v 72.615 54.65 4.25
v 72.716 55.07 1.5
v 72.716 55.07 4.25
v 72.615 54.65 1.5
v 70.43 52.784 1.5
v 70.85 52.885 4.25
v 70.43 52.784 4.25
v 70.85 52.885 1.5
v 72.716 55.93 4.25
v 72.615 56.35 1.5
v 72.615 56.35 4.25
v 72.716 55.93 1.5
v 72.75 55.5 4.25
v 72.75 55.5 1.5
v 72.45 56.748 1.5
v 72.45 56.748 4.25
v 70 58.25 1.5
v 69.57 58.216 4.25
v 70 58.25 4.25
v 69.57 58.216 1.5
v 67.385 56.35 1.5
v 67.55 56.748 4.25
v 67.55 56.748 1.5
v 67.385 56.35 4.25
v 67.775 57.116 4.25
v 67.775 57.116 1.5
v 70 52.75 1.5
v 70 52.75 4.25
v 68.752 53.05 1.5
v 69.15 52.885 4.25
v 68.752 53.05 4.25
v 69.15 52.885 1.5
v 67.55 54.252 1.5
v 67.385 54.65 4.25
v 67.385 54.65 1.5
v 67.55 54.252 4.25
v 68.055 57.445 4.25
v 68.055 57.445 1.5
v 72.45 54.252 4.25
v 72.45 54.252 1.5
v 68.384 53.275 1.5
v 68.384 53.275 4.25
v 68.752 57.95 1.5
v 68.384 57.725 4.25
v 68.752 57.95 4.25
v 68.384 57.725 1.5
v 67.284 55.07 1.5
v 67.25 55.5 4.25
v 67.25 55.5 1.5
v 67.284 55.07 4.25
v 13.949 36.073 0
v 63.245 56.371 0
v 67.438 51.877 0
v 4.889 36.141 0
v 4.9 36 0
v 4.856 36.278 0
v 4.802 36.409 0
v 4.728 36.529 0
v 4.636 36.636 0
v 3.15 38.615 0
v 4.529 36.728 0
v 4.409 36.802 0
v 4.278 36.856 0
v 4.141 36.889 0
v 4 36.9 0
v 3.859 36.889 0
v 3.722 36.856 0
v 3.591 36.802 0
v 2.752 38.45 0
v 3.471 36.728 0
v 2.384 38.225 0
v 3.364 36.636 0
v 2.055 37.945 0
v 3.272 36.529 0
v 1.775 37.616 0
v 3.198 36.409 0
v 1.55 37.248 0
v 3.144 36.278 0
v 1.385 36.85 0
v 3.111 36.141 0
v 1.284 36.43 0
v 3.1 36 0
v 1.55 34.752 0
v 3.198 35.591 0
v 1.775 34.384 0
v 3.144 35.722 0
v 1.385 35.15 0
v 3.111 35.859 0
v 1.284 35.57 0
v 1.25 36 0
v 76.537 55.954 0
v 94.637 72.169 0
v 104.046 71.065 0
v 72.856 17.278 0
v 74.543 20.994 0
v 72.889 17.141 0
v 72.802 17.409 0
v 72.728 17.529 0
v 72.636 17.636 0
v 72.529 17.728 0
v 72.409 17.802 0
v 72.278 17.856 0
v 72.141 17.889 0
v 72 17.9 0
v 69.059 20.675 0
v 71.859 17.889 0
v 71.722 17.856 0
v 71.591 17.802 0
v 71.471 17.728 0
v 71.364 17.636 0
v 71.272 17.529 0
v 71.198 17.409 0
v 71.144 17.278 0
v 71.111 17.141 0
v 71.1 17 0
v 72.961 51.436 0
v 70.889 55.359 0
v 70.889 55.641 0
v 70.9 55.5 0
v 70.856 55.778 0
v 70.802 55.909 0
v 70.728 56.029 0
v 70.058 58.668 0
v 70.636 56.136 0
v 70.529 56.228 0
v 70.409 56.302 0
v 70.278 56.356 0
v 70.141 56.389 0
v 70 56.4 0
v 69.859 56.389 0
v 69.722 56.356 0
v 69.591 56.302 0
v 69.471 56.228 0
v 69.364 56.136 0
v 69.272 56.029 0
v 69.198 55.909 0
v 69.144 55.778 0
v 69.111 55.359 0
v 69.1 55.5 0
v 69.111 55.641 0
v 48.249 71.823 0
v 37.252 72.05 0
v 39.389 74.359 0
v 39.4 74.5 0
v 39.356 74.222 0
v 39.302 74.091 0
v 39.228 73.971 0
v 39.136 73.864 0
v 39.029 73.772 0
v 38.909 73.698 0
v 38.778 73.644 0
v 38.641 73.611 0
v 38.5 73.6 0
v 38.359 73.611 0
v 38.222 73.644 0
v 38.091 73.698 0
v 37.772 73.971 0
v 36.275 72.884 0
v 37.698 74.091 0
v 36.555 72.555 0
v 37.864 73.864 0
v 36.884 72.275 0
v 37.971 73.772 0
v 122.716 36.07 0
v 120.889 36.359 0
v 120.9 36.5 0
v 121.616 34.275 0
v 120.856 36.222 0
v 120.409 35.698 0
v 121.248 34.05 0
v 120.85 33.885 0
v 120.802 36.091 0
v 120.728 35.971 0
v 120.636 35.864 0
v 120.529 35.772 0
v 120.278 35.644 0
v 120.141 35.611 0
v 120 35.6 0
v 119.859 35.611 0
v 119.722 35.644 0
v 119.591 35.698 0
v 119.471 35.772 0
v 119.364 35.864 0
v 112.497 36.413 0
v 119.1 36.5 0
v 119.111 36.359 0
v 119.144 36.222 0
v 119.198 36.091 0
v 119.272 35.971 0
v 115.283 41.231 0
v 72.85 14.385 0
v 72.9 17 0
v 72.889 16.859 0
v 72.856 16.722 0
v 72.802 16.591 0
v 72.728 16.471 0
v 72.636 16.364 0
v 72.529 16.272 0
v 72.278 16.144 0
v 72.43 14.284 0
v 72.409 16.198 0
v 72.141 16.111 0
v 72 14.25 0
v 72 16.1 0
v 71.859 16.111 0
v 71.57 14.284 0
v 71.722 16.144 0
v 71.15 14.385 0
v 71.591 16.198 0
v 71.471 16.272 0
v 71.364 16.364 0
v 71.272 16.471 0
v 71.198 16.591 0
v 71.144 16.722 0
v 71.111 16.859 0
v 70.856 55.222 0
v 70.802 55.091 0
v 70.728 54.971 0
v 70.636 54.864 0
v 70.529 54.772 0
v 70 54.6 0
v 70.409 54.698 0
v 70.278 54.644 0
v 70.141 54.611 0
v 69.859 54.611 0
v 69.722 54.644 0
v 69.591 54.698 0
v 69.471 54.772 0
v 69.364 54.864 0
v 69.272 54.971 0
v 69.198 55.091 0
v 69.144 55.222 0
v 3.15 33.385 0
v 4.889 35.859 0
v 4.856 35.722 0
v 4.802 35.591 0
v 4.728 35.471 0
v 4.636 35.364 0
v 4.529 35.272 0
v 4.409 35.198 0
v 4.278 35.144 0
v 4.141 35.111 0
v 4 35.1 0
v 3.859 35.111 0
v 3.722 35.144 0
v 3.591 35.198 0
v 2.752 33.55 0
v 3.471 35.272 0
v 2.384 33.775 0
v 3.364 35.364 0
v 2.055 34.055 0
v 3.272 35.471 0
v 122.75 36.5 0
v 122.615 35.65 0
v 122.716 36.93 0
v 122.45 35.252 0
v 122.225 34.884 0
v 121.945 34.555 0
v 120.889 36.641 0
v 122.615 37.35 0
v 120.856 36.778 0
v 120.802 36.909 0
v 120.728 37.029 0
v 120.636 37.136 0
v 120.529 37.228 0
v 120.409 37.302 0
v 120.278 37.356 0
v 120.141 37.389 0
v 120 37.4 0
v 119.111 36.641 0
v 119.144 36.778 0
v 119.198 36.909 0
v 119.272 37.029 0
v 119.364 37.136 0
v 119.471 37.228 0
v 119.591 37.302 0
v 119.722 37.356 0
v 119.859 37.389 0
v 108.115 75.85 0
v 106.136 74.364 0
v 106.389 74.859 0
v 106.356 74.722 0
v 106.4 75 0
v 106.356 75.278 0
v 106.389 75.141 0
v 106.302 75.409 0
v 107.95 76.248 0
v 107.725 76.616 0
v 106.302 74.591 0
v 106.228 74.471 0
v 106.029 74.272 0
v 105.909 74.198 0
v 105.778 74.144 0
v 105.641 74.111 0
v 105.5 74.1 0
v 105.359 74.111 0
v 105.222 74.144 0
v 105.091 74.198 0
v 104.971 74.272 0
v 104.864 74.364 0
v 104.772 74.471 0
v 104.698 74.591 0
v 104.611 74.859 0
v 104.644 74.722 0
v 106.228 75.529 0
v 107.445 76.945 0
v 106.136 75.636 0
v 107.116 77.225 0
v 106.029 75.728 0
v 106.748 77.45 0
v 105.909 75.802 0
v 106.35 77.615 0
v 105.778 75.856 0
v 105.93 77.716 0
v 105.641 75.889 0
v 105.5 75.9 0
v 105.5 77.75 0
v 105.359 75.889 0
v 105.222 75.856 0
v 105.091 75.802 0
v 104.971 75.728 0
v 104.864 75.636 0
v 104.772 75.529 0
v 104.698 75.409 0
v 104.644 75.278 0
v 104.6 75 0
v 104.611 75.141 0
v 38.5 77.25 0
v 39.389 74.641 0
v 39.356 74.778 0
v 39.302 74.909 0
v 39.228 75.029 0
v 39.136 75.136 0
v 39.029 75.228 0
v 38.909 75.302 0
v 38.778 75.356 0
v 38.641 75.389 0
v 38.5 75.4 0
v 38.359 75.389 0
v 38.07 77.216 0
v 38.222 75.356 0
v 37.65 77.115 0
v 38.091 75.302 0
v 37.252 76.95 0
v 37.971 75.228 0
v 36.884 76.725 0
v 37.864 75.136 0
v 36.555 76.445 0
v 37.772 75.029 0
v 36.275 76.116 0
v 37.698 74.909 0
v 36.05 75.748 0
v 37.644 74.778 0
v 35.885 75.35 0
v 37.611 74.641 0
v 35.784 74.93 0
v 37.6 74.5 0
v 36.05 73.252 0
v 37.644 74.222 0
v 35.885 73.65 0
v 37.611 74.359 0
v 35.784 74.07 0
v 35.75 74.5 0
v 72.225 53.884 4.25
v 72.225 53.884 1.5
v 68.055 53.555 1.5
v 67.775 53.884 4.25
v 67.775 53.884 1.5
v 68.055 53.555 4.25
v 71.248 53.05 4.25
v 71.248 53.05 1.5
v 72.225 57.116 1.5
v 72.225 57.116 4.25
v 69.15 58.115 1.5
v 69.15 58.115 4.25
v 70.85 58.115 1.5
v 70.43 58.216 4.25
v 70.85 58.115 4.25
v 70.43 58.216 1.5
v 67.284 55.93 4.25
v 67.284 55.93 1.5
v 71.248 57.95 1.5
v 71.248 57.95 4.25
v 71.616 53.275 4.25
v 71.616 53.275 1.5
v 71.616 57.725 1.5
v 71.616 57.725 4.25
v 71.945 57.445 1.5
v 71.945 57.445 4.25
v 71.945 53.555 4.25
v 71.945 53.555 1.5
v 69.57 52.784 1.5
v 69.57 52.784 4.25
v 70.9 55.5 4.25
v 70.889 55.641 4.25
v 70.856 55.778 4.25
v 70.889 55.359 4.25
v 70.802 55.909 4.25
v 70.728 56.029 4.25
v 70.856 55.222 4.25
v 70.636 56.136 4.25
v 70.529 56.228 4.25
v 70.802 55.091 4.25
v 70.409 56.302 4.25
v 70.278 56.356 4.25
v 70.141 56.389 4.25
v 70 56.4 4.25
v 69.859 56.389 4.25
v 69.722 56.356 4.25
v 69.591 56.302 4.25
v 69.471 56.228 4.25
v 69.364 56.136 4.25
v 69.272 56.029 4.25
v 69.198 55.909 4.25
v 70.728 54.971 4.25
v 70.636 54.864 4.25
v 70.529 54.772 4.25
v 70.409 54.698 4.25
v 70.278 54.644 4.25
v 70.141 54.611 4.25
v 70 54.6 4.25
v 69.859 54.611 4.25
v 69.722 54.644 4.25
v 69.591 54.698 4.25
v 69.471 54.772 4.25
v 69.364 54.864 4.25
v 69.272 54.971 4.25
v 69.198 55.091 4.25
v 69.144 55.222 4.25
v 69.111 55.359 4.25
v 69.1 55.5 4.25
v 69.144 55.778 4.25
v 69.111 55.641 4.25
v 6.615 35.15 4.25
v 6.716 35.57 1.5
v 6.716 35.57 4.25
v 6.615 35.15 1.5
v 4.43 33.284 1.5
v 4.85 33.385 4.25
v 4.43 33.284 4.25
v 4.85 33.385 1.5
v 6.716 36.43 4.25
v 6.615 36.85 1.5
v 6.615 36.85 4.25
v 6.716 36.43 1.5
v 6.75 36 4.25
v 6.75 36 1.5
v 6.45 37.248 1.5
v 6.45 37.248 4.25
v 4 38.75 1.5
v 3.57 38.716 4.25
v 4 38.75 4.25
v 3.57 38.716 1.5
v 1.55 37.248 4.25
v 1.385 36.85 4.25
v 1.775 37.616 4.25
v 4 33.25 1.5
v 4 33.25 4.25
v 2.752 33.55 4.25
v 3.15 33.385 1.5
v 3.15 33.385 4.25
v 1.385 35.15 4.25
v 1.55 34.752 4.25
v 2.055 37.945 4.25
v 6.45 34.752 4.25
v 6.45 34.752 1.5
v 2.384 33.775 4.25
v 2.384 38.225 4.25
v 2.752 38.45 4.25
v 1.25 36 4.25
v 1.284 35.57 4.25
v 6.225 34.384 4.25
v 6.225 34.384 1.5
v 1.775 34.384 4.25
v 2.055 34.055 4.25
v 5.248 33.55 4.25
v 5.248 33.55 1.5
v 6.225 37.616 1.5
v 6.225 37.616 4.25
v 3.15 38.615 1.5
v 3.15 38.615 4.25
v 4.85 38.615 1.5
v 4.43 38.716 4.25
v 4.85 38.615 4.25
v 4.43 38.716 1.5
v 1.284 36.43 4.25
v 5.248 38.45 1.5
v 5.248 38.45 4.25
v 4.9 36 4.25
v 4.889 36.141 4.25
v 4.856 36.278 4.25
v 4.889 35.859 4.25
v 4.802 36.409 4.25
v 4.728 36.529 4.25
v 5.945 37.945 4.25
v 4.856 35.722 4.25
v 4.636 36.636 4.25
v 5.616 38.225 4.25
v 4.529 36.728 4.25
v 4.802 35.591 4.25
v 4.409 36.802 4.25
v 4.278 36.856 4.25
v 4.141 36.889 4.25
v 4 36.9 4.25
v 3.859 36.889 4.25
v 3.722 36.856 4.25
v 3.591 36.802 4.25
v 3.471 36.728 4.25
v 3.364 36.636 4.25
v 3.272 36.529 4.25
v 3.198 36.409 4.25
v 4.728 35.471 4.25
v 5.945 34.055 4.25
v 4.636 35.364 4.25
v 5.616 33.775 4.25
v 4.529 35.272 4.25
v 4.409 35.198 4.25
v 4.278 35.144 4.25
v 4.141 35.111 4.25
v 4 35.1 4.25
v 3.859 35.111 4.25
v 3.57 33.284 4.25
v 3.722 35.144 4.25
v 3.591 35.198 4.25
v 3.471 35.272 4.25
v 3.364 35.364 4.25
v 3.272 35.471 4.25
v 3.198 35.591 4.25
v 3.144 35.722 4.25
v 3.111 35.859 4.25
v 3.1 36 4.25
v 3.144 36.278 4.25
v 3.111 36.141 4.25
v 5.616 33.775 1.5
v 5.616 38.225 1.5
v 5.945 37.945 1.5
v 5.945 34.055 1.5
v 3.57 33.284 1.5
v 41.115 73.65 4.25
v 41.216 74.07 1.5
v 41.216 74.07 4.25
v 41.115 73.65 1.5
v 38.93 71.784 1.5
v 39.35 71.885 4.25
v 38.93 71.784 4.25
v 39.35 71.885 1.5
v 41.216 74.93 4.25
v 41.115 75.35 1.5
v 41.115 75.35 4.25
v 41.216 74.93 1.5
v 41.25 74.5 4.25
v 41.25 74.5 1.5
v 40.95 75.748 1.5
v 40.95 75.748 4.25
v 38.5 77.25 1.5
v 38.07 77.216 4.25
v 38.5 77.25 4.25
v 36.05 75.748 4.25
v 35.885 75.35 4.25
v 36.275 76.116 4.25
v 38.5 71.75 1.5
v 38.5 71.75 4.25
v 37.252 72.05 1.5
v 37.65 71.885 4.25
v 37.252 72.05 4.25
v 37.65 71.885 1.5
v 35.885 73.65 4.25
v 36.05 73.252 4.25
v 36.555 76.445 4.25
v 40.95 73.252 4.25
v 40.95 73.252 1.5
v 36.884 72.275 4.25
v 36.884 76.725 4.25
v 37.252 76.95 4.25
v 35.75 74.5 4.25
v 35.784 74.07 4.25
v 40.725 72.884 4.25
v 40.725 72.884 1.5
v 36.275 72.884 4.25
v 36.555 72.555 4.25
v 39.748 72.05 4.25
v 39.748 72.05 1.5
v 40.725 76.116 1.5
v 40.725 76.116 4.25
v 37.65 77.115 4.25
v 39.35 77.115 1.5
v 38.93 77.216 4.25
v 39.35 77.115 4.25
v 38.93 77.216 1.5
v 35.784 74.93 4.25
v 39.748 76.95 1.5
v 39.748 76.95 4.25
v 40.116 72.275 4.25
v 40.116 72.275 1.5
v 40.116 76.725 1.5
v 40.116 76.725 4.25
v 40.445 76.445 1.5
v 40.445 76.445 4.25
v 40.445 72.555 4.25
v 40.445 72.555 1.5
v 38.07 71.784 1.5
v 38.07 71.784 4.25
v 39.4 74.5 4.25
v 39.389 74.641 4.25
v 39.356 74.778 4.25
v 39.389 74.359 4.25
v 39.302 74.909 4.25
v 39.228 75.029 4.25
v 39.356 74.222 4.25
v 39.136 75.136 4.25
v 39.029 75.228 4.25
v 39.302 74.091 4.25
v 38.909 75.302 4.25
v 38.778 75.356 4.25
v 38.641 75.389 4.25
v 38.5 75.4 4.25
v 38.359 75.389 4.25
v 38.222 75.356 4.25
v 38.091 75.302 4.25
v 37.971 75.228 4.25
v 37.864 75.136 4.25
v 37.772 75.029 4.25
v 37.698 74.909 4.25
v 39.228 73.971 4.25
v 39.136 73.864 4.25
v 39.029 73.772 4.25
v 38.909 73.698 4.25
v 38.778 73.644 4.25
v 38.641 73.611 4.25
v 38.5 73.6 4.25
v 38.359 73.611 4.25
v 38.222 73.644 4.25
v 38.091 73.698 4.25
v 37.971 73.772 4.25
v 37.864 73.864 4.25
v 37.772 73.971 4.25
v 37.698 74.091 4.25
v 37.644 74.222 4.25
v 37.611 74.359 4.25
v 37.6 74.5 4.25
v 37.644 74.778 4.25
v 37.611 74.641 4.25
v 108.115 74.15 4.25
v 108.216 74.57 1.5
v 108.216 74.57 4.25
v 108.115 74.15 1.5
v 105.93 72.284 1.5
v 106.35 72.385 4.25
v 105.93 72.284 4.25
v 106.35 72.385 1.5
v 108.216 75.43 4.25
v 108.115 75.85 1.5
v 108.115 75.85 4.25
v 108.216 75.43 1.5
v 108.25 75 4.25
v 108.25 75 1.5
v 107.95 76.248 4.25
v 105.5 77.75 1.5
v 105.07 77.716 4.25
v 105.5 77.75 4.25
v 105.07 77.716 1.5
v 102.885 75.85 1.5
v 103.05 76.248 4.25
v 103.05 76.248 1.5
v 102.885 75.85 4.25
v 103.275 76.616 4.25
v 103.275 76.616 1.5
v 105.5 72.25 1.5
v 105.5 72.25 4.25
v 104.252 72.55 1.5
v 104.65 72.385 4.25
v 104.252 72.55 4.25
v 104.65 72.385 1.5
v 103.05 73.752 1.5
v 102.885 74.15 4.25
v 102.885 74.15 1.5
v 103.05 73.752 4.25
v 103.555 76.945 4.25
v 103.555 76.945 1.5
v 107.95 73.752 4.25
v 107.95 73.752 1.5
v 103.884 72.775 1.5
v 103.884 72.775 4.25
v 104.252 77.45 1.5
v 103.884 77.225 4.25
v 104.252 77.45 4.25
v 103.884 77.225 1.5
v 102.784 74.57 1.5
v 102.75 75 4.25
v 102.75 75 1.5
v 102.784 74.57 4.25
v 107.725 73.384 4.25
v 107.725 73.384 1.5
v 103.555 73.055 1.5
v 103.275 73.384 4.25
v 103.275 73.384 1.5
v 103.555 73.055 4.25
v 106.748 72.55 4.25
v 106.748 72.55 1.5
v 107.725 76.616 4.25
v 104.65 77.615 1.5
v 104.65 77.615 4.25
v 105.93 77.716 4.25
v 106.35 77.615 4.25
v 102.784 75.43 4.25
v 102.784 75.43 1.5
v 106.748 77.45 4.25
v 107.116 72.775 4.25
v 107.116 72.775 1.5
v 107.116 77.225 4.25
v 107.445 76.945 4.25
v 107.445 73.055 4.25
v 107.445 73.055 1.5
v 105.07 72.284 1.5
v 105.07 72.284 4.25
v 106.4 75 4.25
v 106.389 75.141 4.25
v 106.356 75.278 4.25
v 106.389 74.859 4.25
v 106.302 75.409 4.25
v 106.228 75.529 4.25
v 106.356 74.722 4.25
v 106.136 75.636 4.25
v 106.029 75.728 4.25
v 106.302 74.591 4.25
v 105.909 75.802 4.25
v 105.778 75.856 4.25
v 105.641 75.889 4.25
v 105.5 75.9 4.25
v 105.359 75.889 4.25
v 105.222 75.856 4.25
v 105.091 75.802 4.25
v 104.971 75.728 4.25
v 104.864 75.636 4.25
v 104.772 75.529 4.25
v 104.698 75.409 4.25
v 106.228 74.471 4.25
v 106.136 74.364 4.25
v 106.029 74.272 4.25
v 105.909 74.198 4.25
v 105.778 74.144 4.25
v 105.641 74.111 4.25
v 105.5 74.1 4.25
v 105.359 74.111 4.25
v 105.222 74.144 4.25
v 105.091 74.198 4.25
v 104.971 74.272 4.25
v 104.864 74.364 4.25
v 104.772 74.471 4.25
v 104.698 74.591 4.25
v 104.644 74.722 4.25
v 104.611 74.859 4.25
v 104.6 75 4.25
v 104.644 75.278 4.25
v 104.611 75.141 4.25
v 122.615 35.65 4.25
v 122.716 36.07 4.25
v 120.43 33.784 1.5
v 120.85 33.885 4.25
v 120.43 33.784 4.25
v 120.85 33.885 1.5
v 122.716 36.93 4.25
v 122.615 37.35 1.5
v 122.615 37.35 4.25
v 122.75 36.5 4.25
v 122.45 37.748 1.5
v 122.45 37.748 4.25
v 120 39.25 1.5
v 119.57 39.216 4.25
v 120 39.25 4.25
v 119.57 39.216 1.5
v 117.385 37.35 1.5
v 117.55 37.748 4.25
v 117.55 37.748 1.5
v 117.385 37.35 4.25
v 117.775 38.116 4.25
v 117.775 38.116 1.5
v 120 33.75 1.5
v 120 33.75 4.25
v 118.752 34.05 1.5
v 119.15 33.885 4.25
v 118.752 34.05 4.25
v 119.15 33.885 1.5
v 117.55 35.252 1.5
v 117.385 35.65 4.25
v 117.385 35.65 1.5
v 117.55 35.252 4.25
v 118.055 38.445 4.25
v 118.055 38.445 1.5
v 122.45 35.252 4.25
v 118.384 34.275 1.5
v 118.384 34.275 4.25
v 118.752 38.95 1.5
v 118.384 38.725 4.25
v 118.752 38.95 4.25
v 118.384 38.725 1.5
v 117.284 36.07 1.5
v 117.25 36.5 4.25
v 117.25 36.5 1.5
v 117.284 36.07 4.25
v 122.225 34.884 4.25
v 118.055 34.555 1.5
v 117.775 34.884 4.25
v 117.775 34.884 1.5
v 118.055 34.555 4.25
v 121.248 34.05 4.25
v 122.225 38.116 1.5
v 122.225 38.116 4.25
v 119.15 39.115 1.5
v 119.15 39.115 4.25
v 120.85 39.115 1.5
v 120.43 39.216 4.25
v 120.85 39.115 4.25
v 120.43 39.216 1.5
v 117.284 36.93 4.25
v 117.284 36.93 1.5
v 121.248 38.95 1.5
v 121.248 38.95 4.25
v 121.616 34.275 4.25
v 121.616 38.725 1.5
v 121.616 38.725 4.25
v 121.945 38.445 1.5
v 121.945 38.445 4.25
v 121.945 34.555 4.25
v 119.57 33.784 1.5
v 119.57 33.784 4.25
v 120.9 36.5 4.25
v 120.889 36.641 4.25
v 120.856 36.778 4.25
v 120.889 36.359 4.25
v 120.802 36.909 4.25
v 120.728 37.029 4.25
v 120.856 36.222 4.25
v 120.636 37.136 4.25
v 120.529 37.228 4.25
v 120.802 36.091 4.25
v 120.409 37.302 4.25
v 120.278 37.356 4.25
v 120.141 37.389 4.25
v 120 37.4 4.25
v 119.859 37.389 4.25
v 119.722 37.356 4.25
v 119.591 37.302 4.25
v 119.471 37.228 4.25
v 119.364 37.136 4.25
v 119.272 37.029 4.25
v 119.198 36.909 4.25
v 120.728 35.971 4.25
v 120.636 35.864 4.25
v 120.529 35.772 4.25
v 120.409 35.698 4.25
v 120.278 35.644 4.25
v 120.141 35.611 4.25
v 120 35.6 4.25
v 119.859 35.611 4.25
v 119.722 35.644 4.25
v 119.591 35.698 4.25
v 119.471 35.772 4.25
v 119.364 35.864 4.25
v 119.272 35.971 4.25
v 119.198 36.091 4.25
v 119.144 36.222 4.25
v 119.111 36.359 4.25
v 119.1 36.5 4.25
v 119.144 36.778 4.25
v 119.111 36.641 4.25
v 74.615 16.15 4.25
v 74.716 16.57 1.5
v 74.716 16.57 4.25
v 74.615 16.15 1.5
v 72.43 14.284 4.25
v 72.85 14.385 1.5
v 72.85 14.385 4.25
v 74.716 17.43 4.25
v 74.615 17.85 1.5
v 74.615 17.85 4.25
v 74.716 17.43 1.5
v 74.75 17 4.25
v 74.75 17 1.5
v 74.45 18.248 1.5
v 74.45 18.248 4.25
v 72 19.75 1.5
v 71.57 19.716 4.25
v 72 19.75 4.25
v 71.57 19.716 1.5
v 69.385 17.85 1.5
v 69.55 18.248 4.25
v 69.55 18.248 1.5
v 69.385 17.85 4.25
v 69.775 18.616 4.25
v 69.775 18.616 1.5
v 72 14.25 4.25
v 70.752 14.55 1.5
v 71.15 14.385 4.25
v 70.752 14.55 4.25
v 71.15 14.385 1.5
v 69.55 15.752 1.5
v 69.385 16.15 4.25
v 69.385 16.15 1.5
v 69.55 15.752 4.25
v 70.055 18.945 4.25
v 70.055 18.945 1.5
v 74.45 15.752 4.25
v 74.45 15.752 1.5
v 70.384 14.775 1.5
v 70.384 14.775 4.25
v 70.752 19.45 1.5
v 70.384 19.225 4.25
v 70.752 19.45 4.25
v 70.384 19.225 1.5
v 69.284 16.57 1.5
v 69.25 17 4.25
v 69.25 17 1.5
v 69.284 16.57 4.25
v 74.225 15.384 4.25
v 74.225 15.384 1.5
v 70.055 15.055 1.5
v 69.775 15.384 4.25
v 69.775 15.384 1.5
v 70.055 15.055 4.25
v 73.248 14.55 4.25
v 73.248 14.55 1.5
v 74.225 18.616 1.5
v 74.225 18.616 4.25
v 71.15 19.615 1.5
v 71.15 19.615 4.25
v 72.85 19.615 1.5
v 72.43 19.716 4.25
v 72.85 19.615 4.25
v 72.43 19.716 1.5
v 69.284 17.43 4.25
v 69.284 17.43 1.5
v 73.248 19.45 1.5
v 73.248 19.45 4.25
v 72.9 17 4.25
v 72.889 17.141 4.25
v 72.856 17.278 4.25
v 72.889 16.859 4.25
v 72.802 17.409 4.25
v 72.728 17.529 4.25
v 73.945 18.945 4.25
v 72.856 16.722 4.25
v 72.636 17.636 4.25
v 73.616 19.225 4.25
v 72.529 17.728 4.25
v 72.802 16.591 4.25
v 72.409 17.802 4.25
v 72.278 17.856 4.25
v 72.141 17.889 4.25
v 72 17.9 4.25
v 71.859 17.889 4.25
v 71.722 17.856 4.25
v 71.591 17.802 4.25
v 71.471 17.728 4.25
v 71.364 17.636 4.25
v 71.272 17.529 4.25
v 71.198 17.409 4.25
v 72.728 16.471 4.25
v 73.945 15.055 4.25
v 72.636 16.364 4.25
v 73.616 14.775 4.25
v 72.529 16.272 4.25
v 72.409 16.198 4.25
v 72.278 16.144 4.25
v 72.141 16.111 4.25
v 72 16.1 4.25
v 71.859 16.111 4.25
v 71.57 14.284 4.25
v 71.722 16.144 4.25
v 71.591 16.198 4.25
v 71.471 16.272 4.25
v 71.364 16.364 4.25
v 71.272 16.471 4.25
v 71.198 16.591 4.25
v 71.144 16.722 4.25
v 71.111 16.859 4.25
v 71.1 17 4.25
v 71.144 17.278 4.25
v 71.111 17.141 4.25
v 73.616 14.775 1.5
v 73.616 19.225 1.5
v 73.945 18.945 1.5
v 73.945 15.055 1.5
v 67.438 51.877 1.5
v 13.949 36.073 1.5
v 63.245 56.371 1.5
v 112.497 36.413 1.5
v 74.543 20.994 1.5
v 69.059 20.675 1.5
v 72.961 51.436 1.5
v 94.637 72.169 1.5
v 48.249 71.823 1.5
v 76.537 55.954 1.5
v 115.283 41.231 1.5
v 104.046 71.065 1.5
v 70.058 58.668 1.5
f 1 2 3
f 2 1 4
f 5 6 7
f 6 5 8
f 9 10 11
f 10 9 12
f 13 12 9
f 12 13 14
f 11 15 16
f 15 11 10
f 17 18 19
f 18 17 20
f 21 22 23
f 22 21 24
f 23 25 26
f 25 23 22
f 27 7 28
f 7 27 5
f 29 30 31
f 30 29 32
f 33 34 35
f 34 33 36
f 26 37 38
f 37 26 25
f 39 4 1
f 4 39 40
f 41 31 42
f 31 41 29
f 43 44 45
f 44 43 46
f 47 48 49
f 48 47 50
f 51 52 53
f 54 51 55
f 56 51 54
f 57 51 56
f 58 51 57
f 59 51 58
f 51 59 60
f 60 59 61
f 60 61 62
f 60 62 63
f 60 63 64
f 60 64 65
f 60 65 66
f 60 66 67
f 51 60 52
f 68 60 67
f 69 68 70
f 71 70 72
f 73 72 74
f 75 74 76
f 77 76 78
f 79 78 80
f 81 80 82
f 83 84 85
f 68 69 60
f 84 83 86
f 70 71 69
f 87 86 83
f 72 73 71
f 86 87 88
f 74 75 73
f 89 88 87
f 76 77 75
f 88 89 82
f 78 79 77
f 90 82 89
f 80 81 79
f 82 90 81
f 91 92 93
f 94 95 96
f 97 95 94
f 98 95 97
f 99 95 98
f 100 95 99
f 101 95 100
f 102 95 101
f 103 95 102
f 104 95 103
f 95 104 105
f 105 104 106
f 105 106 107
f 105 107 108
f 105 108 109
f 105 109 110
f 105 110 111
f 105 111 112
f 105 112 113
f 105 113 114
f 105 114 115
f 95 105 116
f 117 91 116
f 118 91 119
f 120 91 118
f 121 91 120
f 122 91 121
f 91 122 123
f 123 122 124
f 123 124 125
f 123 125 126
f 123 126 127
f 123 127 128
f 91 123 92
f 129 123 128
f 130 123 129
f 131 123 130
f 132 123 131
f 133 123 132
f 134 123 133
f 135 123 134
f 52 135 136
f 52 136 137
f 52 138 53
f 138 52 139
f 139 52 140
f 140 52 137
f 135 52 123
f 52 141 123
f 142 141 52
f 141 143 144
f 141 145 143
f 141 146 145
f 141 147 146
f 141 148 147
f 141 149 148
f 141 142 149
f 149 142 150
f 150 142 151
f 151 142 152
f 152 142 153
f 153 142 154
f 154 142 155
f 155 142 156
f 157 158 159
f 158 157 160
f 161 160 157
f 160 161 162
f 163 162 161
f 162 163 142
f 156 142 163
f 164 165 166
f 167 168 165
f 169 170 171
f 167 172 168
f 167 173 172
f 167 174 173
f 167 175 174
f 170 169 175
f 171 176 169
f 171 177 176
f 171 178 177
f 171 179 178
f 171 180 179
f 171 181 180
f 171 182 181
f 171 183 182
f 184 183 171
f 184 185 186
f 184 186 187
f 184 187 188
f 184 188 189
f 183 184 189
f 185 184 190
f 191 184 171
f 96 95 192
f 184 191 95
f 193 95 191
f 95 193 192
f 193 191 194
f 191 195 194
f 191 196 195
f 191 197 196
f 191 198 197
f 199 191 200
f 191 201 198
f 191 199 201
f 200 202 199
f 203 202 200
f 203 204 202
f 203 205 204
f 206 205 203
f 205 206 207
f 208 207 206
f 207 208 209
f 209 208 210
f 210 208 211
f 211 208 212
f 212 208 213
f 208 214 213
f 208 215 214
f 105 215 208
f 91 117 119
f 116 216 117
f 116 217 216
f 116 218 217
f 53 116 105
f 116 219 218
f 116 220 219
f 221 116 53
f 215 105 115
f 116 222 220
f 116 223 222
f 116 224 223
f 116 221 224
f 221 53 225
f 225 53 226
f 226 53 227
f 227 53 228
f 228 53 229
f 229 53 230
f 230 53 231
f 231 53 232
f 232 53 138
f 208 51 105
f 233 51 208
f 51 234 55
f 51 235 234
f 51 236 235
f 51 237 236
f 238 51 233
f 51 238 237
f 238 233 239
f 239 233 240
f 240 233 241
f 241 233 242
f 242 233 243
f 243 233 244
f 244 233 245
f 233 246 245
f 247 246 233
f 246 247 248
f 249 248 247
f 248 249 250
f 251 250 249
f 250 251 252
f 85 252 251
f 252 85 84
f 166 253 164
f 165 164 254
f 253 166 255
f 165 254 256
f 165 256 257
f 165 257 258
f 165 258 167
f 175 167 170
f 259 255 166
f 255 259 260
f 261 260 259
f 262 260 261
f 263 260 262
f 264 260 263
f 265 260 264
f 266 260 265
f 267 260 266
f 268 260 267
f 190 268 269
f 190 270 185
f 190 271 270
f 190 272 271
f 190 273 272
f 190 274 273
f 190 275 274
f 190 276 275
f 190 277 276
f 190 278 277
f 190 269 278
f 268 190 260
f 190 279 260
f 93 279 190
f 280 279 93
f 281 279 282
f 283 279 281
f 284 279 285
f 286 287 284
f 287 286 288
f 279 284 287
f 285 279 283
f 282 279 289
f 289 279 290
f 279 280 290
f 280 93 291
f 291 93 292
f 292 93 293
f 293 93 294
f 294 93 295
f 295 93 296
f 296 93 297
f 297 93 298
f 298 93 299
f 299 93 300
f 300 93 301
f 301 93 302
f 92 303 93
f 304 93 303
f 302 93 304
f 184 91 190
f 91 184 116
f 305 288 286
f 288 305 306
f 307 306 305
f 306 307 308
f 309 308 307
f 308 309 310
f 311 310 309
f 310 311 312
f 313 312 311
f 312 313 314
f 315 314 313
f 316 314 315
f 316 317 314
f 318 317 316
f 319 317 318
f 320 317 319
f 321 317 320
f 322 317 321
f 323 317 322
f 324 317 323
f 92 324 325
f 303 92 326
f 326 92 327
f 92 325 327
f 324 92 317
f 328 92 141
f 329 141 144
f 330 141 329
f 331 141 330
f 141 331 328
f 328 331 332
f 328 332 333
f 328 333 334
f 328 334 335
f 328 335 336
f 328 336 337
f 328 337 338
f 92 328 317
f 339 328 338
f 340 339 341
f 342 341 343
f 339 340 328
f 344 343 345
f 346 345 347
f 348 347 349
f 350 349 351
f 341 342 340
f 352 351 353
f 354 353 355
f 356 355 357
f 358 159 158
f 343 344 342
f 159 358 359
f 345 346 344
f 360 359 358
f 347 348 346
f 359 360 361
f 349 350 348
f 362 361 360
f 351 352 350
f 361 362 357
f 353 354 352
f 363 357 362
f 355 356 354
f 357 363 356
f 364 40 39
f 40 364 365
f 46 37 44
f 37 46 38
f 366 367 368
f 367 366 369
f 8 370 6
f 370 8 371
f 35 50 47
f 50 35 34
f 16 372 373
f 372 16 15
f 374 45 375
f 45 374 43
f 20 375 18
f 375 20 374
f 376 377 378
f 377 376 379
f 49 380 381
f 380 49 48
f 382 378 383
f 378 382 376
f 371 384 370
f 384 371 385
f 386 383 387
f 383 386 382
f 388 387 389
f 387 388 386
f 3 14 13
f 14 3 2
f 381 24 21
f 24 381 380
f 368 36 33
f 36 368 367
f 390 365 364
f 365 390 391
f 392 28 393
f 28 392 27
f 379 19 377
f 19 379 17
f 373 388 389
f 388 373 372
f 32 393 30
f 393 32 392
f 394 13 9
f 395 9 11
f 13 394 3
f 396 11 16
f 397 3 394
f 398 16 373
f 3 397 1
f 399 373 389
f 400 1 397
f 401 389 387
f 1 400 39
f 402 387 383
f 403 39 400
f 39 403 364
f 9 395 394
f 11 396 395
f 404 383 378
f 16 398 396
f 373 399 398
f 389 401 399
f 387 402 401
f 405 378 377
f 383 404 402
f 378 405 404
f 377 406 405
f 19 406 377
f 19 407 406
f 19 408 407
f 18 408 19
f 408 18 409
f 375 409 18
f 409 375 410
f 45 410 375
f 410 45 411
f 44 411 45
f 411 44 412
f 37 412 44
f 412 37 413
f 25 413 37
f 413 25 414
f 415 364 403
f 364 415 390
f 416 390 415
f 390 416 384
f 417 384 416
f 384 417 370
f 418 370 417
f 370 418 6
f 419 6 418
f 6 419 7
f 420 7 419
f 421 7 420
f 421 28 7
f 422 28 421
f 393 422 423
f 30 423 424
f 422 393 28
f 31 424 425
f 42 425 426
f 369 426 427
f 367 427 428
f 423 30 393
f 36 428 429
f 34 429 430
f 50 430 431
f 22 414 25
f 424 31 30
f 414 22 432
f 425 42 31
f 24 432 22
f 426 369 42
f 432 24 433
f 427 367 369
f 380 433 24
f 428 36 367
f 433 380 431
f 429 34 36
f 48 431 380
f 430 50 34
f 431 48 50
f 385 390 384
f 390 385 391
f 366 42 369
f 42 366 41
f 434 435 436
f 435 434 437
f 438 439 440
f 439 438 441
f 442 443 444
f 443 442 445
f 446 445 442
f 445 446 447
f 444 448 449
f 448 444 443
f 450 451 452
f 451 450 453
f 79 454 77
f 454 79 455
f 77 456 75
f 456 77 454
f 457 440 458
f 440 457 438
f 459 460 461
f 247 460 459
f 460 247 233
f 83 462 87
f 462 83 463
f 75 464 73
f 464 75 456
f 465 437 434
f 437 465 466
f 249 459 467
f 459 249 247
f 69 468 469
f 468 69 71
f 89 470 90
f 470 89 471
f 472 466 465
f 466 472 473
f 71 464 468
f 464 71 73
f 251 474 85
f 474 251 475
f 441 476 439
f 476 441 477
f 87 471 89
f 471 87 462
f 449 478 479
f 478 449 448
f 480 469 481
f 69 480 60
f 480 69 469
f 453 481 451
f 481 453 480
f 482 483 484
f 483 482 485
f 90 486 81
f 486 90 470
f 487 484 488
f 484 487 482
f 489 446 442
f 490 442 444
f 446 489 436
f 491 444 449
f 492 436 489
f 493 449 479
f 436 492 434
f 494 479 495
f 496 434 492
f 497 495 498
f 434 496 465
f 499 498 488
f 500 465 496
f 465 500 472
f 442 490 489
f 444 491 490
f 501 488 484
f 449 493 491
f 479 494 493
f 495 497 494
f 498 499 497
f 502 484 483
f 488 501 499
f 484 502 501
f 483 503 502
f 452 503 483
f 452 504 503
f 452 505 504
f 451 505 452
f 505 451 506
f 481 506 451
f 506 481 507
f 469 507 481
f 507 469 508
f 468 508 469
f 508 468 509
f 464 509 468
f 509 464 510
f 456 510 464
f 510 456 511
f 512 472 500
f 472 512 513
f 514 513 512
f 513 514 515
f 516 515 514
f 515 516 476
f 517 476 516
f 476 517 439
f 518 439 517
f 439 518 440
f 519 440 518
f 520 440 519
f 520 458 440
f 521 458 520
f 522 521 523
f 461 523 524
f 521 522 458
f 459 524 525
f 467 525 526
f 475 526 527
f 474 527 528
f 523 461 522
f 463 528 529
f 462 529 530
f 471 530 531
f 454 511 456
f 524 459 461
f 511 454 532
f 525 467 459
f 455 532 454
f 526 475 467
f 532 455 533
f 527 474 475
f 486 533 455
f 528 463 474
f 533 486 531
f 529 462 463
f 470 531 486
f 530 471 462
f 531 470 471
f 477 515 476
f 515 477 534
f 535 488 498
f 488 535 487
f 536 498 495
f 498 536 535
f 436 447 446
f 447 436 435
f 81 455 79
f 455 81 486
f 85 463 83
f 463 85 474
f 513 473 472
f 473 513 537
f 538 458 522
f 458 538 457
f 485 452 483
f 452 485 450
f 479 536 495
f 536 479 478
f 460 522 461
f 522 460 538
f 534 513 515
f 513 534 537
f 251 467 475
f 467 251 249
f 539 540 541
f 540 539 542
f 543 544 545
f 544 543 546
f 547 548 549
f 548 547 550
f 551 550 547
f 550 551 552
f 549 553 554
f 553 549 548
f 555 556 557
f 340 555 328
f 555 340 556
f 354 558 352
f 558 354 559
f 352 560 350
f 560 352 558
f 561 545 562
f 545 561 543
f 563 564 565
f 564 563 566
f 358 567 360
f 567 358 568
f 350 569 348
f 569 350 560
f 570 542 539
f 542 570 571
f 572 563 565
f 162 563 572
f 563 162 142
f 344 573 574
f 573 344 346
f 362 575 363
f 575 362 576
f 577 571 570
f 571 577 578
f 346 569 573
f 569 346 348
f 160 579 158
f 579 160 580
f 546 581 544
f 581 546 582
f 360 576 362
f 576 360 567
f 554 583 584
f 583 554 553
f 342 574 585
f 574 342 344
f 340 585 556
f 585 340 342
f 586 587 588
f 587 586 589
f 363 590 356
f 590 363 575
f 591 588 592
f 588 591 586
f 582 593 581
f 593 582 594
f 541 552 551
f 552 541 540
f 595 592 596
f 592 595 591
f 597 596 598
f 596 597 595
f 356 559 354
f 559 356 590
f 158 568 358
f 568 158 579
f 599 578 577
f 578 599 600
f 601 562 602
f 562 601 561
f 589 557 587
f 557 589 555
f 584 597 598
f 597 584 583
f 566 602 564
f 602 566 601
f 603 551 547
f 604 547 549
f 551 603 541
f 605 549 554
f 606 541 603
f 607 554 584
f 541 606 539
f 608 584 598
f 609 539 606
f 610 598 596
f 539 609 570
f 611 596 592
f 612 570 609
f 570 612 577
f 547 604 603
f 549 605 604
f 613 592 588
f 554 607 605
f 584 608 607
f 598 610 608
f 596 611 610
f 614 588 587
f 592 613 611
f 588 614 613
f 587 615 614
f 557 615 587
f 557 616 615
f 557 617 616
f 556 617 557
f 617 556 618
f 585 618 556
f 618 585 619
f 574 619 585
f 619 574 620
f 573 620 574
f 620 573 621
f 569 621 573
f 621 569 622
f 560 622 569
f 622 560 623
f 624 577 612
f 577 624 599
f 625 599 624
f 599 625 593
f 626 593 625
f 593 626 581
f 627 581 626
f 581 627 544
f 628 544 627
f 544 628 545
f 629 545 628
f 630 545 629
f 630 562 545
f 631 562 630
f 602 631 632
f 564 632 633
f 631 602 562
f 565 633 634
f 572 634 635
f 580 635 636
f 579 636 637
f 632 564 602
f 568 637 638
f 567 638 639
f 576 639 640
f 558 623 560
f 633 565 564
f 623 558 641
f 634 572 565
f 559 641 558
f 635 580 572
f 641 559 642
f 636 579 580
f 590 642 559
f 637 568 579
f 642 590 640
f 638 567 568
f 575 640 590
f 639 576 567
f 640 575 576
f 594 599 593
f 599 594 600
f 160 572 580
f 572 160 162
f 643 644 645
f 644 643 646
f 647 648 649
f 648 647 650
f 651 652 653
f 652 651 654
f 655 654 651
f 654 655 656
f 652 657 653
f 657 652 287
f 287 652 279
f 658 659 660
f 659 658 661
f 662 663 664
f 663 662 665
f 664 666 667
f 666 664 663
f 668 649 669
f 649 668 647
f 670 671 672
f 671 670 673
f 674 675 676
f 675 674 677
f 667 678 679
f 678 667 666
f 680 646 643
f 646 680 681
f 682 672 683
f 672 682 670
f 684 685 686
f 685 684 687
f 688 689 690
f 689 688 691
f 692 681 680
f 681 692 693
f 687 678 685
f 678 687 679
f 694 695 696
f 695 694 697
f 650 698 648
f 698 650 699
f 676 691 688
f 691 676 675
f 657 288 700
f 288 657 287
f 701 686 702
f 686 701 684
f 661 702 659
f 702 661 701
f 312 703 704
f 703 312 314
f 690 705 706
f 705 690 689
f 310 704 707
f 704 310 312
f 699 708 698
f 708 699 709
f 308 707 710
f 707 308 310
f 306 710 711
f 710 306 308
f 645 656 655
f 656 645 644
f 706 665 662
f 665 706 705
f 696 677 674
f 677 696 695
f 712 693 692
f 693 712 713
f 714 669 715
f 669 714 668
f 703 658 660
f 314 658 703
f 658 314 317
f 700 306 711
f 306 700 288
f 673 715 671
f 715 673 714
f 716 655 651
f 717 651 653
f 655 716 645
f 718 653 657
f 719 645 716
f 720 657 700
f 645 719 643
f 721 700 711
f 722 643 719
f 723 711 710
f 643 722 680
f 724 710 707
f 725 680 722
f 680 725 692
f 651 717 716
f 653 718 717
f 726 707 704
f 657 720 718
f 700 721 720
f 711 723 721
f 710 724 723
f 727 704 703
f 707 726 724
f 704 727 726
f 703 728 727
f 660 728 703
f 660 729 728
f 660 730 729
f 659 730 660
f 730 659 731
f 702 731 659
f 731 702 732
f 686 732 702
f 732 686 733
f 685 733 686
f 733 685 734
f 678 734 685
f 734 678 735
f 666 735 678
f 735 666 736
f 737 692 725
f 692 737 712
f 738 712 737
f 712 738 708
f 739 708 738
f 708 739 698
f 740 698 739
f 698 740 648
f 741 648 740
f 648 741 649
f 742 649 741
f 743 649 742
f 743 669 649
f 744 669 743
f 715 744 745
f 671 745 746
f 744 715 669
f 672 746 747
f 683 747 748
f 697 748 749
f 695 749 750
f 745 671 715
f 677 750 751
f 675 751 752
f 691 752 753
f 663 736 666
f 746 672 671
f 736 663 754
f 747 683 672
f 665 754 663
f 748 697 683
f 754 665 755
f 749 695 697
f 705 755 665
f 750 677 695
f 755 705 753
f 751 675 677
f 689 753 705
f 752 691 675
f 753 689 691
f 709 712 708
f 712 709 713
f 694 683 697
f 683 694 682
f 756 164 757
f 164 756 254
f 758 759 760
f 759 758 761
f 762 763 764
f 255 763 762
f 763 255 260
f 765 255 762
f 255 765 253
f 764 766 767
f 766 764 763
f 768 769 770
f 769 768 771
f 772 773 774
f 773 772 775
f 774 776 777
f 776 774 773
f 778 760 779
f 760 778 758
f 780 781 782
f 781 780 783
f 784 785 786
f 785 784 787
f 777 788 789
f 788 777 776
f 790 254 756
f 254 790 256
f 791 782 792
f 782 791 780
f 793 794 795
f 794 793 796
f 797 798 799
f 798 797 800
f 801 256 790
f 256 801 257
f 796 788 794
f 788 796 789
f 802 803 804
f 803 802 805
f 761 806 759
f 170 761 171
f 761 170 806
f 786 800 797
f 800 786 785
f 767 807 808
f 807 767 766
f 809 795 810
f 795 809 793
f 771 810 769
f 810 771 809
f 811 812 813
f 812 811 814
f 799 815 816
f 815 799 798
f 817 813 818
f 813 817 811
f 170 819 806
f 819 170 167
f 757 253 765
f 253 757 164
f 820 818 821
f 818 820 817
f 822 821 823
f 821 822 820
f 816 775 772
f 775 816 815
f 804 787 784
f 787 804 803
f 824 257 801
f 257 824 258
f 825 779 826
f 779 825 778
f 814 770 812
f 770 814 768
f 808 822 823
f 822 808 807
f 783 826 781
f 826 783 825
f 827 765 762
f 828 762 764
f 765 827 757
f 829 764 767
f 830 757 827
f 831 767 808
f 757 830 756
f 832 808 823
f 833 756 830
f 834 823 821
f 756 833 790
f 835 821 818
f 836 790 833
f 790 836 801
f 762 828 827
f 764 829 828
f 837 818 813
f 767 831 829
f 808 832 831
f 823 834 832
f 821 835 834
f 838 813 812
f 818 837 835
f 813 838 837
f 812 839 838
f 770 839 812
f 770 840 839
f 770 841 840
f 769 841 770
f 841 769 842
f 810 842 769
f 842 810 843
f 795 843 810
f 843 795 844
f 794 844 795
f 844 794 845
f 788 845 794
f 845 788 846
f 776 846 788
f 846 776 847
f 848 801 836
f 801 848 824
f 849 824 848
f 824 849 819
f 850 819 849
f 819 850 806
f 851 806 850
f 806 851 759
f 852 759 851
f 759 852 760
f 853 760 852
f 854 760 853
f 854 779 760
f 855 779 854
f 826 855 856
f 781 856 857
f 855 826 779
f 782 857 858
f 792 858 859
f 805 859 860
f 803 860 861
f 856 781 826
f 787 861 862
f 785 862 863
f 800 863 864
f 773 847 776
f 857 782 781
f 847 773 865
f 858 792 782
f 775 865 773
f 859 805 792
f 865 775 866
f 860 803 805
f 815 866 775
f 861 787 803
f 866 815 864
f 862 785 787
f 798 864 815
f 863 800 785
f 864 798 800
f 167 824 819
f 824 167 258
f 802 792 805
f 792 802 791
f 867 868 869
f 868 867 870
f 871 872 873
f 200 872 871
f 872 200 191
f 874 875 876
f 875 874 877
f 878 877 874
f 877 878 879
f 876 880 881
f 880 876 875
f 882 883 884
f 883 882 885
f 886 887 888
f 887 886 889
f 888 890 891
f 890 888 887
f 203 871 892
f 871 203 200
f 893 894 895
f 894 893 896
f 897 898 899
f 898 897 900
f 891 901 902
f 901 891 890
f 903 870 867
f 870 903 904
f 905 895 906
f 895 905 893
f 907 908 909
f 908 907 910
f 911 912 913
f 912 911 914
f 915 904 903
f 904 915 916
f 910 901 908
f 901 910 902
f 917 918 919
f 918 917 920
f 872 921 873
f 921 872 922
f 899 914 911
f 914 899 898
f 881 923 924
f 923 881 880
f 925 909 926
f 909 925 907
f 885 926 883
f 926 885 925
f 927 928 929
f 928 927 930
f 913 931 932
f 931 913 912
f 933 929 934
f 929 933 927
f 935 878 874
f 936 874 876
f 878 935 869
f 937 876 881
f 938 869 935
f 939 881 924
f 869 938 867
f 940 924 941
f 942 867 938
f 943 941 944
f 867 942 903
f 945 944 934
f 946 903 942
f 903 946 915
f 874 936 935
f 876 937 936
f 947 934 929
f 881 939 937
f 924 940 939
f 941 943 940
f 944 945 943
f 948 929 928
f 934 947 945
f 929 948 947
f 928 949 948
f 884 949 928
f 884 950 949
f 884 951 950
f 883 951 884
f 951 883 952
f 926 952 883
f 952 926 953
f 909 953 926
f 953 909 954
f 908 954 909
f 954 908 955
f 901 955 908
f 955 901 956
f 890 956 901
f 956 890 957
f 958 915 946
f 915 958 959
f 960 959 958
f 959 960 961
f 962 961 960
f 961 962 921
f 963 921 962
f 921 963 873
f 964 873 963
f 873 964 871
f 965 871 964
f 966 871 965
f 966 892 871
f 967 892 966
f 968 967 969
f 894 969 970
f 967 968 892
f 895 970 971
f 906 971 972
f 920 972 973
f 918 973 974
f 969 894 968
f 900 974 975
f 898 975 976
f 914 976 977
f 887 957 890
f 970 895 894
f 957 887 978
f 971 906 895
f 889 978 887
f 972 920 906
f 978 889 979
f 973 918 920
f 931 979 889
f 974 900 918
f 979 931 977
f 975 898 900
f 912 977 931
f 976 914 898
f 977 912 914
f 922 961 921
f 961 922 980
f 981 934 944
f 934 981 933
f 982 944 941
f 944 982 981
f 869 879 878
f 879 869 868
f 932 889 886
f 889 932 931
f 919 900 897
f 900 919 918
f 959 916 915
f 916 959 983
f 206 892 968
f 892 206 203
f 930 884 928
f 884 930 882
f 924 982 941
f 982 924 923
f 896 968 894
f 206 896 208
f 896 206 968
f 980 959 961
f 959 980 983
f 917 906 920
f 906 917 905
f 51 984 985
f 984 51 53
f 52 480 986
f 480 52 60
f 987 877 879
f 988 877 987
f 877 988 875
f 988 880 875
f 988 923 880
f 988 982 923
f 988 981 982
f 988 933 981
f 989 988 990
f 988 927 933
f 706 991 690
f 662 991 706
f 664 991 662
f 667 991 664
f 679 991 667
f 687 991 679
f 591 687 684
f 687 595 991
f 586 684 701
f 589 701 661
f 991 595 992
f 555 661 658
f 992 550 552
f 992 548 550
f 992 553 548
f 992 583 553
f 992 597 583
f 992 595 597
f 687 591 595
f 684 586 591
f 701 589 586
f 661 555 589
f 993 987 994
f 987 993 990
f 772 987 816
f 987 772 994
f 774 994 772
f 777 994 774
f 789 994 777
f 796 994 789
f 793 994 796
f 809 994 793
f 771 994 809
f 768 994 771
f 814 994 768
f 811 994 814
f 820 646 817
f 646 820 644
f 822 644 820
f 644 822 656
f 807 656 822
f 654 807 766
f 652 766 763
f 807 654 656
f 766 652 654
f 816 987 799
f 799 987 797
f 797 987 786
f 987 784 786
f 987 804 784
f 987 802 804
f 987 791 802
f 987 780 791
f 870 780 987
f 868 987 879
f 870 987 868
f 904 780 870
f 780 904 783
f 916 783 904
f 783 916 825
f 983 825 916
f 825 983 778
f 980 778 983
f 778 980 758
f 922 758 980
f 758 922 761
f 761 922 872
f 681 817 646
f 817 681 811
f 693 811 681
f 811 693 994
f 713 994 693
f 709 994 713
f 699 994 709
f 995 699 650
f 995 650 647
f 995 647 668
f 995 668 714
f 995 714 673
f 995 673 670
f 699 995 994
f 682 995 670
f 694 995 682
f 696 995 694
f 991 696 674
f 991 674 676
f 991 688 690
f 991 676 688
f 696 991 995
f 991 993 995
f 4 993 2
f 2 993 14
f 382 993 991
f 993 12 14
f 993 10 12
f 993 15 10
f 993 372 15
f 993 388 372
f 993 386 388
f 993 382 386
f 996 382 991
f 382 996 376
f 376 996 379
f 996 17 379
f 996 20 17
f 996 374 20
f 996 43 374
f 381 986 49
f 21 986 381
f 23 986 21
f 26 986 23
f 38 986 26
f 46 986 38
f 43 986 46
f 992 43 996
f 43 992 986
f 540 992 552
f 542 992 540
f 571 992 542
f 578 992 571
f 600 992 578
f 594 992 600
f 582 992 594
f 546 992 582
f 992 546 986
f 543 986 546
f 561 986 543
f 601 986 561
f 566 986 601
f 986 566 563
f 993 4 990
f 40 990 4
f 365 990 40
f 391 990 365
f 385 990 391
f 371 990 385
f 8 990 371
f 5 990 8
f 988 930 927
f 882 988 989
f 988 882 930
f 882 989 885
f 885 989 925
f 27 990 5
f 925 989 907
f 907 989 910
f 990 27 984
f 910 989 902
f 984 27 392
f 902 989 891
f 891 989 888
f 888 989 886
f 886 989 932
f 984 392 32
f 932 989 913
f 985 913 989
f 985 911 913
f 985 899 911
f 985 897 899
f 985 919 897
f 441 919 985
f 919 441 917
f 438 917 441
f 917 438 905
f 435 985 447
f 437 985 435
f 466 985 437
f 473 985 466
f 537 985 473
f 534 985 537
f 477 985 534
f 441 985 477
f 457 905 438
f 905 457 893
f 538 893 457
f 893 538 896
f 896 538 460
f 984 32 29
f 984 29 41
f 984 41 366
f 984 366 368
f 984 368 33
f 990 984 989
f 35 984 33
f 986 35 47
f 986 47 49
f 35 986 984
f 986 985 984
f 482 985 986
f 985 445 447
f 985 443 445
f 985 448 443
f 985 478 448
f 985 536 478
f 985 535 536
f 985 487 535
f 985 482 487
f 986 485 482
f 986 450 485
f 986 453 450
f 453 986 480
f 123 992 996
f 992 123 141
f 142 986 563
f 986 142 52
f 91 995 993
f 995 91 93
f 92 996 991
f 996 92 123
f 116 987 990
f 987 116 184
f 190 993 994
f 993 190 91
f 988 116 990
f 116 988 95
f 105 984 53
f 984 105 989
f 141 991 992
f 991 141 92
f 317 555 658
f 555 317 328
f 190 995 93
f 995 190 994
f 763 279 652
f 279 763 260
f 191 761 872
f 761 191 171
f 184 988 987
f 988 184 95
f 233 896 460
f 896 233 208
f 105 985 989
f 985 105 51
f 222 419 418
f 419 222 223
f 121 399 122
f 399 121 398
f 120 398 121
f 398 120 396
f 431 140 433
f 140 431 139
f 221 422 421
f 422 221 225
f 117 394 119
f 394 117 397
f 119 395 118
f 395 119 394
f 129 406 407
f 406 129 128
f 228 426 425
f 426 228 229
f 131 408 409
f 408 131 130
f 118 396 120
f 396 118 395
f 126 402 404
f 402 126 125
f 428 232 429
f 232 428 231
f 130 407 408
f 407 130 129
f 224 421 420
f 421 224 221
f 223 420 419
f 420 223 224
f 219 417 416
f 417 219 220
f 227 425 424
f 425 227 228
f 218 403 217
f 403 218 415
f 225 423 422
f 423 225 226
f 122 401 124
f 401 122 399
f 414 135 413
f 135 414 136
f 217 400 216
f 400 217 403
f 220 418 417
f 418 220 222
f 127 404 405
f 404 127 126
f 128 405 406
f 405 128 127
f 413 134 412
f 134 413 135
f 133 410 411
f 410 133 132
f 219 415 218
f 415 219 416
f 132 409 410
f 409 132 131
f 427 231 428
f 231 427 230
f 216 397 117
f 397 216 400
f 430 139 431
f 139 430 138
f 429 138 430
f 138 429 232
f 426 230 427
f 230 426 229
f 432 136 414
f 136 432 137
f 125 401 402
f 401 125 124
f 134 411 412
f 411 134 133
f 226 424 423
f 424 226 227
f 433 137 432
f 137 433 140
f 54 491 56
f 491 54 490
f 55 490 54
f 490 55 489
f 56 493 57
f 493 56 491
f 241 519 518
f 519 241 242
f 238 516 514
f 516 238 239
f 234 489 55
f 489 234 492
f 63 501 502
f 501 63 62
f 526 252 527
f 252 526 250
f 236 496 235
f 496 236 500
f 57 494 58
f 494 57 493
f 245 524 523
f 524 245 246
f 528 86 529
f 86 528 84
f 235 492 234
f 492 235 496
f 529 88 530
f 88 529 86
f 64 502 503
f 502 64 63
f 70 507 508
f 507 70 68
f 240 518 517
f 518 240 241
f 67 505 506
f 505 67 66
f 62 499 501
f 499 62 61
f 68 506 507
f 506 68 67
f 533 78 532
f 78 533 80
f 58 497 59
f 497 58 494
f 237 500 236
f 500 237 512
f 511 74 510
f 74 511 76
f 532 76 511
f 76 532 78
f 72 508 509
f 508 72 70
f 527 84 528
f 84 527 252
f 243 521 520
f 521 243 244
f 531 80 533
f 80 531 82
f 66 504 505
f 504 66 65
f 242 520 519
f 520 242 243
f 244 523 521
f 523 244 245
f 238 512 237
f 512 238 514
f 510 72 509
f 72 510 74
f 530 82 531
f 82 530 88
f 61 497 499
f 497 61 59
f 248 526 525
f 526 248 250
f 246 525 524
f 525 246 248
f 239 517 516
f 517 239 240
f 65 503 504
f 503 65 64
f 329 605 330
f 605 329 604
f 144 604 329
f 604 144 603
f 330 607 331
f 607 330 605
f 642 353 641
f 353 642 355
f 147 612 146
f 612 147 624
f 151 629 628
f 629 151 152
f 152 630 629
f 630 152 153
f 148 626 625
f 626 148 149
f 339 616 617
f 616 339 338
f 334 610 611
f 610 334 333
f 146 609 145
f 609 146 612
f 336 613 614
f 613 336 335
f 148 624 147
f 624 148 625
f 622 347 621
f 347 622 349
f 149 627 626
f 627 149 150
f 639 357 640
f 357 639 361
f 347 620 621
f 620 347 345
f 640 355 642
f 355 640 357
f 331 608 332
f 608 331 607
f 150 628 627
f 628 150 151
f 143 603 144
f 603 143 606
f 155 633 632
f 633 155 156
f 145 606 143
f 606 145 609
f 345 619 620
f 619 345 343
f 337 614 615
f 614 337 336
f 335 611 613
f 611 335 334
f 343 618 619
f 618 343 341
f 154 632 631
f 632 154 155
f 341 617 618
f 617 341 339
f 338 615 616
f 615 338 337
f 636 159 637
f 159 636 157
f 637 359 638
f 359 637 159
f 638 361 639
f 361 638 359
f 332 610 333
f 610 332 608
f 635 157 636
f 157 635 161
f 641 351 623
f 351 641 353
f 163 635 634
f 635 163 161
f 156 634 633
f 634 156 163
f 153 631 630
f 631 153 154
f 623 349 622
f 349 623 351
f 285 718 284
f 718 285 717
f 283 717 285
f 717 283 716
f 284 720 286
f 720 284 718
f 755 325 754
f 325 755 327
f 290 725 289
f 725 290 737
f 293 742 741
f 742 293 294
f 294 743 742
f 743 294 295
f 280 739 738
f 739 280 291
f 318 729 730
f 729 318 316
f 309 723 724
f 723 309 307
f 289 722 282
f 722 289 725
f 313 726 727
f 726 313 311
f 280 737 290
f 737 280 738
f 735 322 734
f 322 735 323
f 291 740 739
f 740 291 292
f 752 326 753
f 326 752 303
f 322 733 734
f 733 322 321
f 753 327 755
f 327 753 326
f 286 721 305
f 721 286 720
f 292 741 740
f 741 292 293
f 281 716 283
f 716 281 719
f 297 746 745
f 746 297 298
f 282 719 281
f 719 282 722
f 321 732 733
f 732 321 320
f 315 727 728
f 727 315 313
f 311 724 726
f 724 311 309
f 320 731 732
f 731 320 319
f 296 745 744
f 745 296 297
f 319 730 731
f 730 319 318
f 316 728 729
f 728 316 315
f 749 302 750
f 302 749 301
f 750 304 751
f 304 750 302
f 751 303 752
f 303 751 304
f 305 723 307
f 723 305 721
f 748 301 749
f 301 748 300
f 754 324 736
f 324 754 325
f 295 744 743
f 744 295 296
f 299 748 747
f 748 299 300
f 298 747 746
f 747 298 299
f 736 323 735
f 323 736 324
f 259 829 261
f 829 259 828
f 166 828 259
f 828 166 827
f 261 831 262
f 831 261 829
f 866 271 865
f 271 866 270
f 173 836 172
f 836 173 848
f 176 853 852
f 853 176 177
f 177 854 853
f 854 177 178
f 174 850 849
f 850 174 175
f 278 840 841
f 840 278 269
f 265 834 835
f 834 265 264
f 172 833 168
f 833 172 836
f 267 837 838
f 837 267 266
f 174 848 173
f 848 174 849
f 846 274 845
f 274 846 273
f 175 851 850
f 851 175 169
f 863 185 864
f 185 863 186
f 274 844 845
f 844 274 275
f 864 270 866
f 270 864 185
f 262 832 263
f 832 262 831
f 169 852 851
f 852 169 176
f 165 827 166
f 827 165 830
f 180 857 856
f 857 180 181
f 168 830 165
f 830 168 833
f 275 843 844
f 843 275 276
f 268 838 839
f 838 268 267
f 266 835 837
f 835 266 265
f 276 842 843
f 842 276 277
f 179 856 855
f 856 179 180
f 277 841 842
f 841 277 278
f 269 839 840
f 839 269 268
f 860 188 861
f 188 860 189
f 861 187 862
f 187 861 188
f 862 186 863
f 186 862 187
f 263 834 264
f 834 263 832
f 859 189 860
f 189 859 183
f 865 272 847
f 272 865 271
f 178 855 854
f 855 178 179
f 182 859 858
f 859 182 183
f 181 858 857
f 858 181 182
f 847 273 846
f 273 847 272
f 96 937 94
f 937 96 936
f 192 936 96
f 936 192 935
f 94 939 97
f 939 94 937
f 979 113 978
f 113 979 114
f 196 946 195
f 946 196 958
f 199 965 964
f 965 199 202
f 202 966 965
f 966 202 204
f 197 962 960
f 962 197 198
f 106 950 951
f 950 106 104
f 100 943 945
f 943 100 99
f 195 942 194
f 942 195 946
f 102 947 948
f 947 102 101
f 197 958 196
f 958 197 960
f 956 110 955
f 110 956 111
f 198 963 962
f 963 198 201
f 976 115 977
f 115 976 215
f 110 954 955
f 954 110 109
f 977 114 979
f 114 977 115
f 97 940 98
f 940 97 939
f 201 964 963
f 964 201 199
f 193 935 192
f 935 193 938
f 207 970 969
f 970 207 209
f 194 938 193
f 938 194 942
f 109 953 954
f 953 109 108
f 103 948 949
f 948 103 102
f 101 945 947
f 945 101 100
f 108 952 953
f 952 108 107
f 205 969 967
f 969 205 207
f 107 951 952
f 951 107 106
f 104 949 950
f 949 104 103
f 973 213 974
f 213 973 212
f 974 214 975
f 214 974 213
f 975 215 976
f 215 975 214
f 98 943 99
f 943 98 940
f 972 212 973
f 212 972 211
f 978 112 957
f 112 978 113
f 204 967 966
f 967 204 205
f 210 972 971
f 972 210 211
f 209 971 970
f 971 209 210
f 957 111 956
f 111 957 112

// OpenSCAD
totHt   = 4.25; // 4.25 fits too nicely, loose
webHt   = 1.5;
supDia  = 5.5;
boltDia = 1.8;

$fn=40;

supports=[[70,55.5,0],
          [4,36,0],
          [38.5,74.5,0],
          [105.5,75,0],
          [120,36.5,0],
          [72,17,0]];

complete();

module complete() {
   difference() {
      web();

      for (i=[0:5]) {
         translate(supports[i]) {
            translate([0,0,-0.1]) cylinder(h=totHt+0.2,d=boltDia);
         }
      }
   }
}

module web() {
   for (i=[0:5]) {
      translate(supports[i]) {
         cylinder(h=totHt,d=supDia);
      }
   }
   for(i=[1:5]) {
      hull() {
         translate(supports[0]) cylinder(h=webHt,d=supDia);
         translate(supports[i]) cylinder(h=webHt,d=supDia);
      }
   }

   for(i=[3:5]) {
      hull() {
         translate(supports[i-1]) cylinder(h=webHt,d=supDia);
         translate(supports[i]) cylinder(h=webHt,d=supDia);
      }
   }
   hull() {
      translate(supports[1]) cylinder(h=webHt,d=supDia);
      translate(supports[5]) cylinder(h=webHt,d=supDia);
   }
}
